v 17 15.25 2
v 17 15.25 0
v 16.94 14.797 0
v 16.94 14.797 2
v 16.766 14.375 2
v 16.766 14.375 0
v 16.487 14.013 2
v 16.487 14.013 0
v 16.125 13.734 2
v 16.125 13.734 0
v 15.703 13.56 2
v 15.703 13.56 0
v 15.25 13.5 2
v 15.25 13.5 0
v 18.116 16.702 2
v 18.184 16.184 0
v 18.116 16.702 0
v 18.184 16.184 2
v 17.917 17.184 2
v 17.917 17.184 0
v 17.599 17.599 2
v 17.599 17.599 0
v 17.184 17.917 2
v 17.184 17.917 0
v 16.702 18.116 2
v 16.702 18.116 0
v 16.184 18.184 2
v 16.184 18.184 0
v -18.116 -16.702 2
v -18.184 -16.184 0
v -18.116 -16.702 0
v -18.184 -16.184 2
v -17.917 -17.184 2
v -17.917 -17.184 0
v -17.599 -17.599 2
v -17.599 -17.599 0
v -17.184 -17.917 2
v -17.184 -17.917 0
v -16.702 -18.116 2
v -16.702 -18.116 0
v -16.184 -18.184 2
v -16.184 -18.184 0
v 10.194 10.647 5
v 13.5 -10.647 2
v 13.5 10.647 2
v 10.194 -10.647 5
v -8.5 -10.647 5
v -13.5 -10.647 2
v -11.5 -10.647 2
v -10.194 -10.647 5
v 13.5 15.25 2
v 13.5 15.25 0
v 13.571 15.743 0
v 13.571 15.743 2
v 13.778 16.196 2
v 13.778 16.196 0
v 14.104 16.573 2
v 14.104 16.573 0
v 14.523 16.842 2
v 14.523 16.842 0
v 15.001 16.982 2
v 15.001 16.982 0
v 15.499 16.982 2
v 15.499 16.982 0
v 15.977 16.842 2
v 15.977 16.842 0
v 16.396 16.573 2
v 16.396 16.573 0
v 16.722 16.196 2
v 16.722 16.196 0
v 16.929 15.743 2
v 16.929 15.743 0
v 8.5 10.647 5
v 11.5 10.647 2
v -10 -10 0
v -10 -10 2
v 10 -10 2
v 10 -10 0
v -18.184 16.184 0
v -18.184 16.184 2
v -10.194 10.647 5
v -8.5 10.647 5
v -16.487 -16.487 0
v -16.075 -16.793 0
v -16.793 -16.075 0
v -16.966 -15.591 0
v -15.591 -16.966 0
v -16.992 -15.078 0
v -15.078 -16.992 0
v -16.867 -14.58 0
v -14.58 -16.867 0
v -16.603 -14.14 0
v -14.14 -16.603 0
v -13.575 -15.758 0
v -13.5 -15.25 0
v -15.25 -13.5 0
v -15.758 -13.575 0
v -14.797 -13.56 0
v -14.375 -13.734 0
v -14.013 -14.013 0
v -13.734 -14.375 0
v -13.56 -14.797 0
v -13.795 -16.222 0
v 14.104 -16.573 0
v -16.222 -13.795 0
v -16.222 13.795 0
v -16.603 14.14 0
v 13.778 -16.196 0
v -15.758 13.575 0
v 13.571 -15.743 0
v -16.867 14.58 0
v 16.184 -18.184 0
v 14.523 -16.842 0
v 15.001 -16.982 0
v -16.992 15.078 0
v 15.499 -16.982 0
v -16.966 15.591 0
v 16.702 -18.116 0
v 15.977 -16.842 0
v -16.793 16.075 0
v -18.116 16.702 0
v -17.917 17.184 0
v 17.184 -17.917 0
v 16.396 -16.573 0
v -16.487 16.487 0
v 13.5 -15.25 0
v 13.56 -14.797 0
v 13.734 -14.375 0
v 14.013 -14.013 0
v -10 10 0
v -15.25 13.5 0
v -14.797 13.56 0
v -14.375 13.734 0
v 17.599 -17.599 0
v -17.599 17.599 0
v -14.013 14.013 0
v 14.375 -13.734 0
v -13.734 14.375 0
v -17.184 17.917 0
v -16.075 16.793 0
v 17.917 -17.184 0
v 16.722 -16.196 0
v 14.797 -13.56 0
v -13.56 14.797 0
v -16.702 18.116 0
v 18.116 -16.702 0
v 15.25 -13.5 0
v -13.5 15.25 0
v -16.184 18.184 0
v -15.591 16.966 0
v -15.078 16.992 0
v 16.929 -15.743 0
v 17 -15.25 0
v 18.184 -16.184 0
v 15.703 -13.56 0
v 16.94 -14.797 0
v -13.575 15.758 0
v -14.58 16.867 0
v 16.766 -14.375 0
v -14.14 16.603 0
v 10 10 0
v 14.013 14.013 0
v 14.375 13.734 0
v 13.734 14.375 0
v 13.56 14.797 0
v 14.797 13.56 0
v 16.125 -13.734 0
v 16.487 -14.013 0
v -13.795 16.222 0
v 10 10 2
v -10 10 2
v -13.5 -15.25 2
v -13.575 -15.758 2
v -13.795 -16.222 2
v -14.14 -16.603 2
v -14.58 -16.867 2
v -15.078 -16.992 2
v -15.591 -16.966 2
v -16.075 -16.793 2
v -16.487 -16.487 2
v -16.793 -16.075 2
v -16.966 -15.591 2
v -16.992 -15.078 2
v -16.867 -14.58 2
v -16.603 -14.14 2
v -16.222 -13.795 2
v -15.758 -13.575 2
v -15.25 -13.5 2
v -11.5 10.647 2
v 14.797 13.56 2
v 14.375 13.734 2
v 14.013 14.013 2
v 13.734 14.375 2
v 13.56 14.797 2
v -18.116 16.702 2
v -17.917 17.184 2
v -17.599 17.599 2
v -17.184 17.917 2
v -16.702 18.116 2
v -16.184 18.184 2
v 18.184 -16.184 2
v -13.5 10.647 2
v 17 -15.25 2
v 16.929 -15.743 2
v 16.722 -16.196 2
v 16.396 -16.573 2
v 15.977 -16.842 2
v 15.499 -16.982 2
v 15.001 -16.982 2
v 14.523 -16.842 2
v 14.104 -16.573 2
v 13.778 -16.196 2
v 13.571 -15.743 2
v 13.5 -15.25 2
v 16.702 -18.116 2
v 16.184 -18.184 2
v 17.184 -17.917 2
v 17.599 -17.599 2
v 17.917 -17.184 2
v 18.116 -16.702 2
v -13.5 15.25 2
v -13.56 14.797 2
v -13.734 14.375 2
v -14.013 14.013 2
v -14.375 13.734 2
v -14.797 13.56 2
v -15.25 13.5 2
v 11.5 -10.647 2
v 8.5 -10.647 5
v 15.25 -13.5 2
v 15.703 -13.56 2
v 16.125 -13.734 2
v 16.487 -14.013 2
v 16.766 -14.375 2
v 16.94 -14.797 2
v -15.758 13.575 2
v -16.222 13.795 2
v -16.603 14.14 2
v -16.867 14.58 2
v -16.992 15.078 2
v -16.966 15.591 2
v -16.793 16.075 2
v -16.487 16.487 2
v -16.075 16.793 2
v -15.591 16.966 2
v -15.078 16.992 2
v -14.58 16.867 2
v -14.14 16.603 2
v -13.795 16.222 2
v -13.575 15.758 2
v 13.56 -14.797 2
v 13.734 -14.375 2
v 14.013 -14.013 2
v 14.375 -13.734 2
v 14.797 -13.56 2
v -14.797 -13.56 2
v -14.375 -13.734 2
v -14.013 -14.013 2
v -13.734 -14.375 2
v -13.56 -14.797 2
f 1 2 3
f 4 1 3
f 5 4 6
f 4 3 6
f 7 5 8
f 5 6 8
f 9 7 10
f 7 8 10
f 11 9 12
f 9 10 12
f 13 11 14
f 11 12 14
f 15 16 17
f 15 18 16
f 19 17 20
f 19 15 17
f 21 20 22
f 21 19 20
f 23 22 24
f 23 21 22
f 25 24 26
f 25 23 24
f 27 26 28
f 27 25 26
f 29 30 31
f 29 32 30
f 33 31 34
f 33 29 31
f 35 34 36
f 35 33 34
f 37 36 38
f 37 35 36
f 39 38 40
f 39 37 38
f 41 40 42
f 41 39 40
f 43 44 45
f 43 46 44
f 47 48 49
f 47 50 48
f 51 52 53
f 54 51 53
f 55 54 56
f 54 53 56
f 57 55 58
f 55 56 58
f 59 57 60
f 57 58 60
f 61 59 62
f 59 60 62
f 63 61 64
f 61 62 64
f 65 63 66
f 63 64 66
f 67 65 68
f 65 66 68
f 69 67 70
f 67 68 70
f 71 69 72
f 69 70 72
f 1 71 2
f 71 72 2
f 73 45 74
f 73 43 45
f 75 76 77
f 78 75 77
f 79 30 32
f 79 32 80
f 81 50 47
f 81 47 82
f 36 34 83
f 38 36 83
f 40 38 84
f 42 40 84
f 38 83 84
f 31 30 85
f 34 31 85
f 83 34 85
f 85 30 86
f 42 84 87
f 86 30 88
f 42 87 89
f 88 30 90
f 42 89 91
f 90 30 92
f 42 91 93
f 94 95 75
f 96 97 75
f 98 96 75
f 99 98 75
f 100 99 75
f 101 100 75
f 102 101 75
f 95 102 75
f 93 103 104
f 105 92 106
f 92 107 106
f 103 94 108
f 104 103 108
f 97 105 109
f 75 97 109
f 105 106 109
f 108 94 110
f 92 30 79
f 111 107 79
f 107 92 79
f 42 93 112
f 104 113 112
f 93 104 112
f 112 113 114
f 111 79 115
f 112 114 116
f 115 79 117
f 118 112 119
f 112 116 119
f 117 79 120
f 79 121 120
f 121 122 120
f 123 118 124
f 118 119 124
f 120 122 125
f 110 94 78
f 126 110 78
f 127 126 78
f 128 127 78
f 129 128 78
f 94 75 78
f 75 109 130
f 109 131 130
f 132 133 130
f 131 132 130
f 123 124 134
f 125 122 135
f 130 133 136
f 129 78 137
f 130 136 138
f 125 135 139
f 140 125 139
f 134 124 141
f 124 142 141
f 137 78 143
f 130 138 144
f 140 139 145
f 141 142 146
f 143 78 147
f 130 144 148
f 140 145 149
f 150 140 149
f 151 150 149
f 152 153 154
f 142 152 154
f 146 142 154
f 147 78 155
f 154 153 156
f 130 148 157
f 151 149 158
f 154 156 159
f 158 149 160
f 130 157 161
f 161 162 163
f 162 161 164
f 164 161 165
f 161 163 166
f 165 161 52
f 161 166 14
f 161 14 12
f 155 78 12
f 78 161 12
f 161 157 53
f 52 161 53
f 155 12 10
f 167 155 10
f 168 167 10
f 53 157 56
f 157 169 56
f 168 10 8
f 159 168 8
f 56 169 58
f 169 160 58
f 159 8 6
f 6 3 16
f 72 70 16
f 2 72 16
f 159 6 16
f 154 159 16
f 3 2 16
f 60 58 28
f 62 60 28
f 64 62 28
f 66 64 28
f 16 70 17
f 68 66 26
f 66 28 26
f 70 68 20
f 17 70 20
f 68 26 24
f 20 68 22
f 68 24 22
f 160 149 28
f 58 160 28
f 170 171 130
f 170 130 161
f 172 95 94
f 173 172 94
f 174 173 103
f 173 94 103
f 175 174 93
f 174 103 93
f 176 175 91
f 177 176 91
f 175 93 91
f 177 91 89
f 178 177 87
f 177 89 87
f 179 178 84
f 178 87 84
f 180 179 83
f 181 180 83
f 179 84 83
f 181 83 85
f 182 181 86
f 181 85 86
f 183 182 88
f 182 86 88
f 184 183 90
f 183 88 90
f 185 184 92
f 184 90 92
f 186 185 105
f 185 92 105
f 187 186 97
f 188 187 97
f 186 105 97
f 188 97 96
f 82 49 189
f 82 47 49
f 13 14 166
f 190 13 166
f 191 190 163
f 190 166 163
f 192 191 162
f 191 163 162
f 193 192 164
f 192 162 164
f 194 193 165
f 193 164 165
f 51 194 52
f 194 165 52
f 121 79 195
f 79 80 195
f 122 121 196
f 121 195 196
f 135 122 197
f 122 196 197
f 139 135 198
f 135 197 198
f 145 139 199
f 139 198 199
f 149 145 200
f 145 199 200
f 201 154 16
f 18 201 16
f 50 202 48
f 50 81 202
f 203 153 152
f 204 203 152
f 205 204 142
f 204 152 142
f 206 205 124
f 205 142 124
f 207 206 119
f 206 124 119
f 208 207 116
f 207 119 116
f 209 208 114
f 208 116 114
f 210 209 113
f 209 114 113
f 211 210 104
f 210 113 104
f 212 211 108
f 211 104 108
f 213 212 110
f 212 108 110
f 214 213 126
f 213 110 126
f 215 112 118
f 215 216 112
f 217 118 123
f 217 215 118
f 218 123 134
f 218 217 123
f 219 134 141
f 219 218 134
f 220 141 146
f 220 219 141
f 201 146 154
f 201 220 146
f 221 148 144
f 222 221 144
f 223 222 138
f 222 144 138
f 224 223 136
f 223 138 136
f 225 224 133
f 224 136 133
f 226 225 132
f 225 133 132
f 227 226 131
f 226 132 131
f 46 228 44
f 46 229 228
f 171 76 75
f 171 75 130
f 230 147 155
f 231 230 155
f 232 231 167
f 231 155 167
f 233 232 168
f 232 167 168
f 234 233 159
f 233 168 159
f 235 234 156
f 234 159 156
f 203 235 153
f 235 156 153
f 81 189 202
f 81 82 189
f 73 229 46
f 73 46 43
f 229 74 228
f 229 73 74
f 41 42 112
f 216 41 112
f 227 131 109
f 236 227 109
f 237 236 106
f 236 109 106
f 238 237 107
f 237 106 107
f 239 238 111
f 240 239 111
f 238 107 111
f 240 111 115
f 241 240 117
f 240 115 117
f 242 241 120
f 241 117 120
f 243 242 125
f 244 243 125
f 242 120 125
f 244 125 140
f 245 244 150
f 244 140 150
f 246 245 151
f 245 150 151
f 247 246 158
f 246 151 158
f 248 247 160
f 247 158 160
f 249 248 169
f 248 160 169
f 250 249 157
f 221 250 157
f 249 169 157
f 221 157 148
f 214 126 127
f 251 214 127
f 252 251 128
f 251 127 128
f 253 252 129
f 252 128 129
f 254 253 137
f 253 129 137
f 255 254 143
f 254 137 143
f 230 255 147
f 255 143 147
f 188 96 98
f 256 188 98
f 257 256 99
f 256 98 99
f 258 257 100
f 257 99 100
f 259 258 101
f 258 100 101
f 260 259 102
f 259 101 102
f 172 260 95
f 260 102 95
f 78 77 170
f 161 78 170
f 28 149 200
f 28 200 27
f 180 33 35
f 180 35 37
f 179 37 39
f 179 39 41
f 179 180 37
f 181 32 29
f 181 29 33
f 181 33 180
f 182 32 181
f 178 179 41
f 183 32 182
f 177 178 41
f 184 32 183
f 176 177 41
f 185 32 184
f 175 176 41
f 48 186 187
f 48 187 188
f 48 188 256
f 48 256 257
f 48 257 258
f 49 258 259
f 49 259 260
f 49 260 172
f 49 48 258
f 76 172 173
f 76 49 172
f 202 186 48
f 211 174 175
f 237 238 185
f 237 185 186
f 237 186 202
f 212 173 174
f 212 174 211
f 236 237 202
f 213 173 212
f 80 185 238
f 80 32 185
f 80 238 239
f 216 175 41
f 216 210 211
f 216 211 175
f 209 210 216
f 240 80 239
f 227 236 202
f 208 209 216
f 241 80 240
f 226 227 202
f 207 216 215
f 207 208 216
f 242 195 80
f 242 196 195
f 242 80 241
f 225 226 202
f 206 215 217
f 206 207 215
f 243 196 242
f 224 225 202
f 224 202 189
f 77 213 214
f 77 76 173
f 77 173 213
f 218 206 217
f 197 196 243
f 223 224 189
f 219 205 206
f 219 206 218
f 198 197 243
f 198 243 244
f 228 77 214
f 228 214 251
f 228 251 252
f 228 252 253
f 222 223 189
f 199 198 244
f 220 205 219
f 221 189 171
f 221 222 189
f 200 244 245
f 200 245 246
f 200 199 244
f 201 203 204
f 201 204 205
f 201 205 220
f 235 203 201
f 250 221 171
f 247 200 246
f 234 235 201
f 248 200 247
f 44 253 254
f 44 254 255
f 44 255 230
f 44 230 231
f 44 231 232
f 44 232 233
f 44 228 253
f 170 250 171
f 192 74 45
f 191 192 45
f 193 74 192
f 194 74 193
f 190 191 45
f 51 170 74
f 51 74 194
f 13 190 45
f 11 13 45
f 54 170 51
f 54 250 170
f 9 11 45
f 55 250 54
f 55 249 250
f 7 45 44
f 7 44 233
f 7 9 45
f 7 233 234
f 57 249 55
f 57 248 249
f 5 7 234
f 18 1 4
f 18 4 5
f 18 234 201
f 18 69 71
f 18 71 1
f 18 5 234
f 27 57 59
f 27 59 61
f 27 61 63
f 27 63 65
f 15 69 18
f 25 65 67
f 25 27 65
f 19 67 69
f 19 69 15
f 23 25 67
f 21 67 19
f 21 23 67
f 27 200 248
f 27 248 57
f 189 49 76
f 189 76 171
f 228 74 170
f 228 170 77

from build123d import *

# Parameters (mm, degrees)
F0_W     = 36.3689862838
F0_H     = 36.3689862838
F1_DEPTH = 2
F2_R     = 2
F3_W     = 20
F3_H     = 20
F4_DEPTH = 25
F5_W     = 2
F5_H     = 21.2931740639
F7_W     = 1.6942393252
F7_H     = 21.2931740639


with BuildPart() as f1:
    # F0 (on Top) → F1 (new body)
    with BuildSketch(Plane.XY):
        Rectangle(F0_W, F0_H)
        with BuildLine():
            ThreePointArc((-15.25, 13.5), (-16.4874368671, 16.4874368671), (-13.5, 15.25))
            Line((-13.5, 15.25), (13.5, 15.25))
            ThreePointArc((13.5, 15.25), (15.25, 17), (17, 15.25))
            ThreePointArc((17, 15.25), (16.4874368671, 14.0125631329), (15.25, 13.5))
            Line((15.25, 13.5), (15.25, -13.5))
            ThreePointArc((15.25, -13.5), (16.4874368671, -14.0125631329), (17, -15.25))
            ThreePointArc((17, -15.25), (15.25, -17), (13.5, -15.25))
            Line((13.5, -15.25), (-13.5, -15.25))
            ThreePointArc((-13.5, -15.25), (-16.4874368671, -16.4874368671), (-15.25, -13.5))
            Line((-15.25, -13.5), (-15.25, 13.5))
        make_face(mode=Mode.SUBTRACT)
        with BuildLine():
            Line((13.5, 15.25), (-13.5, 15.25))
            ThreePointArc((-13.5, 15.25), (-14.0125631329, 14.0125631329), (-15.25, 13.5))
            Line((-15.25, 13.5), (-15.25, -13.5))
            ThreePointArc((-15.25, -13.5), (-14.0125631329, -14.0125631329), (-13.5, -15.25))
            Line((-13.5, -15.25), (13.5, -15.25))
            ThreePointArc((13.5, -15.25), (14.0125631329, -14.0125631329), (15.25, -13.5))
            Line((15.25, -13.5), (15.25, 13.5))
            ThreePointArc((15.25, 13.5), (14.0125631329, 14.0125631329), (13.5, 15.25))
        make_face()
    extrude(amount=F1_DEPTH)

    # F2
    f2_edges = [f1.edges().sort_by_distance(p)[0] for p in [
        (-18.184493, 18.184493, 1),
        (-18.184493, -18.184493, 1),
        (18.184493, 18.184493, 1),
        (18.184493, -18.184493, 1),
    ]]
    fillet(f2_edges, radius=F2_R)

    # F3 (on face) → F4 (cut)
    with BuildSketch(Plane.XY.offset(2)):
        Rectangle(F3_W, F3_H)
    extrude(amount=-F4_DEPTH, mode=Mode.SUBTRACT)

    # F5 (on face) → F8 section 0
    with BuildSketch(Plane.XY.offset(2)):
        with Locations((-12.5, 0)):
            Rectangle(F5_W, F5_H)
    # F7 (on offset) → F8 section 1
    with BuildSketch(Plane.XY.offset(5)):
        with Locations((-9.3471196626, 0)):
            Rectangle(F7_W, F7_H)
    loft()

    # F5 (on face) → F9 section 0
    with BuildSketch(Plane.XY.offset(2)):
        with Locations((12.5, 0)):
            Rectangle(F5_W, F5_H)
    # F7 (on offset) → F9 section 1
    with BuildSketch(Plane.XY.offset(5)):
        with Locations((9.3471196626, 0)):
            Rectangle(F7_W, F7_H)
    loft()


solid = f1.part
